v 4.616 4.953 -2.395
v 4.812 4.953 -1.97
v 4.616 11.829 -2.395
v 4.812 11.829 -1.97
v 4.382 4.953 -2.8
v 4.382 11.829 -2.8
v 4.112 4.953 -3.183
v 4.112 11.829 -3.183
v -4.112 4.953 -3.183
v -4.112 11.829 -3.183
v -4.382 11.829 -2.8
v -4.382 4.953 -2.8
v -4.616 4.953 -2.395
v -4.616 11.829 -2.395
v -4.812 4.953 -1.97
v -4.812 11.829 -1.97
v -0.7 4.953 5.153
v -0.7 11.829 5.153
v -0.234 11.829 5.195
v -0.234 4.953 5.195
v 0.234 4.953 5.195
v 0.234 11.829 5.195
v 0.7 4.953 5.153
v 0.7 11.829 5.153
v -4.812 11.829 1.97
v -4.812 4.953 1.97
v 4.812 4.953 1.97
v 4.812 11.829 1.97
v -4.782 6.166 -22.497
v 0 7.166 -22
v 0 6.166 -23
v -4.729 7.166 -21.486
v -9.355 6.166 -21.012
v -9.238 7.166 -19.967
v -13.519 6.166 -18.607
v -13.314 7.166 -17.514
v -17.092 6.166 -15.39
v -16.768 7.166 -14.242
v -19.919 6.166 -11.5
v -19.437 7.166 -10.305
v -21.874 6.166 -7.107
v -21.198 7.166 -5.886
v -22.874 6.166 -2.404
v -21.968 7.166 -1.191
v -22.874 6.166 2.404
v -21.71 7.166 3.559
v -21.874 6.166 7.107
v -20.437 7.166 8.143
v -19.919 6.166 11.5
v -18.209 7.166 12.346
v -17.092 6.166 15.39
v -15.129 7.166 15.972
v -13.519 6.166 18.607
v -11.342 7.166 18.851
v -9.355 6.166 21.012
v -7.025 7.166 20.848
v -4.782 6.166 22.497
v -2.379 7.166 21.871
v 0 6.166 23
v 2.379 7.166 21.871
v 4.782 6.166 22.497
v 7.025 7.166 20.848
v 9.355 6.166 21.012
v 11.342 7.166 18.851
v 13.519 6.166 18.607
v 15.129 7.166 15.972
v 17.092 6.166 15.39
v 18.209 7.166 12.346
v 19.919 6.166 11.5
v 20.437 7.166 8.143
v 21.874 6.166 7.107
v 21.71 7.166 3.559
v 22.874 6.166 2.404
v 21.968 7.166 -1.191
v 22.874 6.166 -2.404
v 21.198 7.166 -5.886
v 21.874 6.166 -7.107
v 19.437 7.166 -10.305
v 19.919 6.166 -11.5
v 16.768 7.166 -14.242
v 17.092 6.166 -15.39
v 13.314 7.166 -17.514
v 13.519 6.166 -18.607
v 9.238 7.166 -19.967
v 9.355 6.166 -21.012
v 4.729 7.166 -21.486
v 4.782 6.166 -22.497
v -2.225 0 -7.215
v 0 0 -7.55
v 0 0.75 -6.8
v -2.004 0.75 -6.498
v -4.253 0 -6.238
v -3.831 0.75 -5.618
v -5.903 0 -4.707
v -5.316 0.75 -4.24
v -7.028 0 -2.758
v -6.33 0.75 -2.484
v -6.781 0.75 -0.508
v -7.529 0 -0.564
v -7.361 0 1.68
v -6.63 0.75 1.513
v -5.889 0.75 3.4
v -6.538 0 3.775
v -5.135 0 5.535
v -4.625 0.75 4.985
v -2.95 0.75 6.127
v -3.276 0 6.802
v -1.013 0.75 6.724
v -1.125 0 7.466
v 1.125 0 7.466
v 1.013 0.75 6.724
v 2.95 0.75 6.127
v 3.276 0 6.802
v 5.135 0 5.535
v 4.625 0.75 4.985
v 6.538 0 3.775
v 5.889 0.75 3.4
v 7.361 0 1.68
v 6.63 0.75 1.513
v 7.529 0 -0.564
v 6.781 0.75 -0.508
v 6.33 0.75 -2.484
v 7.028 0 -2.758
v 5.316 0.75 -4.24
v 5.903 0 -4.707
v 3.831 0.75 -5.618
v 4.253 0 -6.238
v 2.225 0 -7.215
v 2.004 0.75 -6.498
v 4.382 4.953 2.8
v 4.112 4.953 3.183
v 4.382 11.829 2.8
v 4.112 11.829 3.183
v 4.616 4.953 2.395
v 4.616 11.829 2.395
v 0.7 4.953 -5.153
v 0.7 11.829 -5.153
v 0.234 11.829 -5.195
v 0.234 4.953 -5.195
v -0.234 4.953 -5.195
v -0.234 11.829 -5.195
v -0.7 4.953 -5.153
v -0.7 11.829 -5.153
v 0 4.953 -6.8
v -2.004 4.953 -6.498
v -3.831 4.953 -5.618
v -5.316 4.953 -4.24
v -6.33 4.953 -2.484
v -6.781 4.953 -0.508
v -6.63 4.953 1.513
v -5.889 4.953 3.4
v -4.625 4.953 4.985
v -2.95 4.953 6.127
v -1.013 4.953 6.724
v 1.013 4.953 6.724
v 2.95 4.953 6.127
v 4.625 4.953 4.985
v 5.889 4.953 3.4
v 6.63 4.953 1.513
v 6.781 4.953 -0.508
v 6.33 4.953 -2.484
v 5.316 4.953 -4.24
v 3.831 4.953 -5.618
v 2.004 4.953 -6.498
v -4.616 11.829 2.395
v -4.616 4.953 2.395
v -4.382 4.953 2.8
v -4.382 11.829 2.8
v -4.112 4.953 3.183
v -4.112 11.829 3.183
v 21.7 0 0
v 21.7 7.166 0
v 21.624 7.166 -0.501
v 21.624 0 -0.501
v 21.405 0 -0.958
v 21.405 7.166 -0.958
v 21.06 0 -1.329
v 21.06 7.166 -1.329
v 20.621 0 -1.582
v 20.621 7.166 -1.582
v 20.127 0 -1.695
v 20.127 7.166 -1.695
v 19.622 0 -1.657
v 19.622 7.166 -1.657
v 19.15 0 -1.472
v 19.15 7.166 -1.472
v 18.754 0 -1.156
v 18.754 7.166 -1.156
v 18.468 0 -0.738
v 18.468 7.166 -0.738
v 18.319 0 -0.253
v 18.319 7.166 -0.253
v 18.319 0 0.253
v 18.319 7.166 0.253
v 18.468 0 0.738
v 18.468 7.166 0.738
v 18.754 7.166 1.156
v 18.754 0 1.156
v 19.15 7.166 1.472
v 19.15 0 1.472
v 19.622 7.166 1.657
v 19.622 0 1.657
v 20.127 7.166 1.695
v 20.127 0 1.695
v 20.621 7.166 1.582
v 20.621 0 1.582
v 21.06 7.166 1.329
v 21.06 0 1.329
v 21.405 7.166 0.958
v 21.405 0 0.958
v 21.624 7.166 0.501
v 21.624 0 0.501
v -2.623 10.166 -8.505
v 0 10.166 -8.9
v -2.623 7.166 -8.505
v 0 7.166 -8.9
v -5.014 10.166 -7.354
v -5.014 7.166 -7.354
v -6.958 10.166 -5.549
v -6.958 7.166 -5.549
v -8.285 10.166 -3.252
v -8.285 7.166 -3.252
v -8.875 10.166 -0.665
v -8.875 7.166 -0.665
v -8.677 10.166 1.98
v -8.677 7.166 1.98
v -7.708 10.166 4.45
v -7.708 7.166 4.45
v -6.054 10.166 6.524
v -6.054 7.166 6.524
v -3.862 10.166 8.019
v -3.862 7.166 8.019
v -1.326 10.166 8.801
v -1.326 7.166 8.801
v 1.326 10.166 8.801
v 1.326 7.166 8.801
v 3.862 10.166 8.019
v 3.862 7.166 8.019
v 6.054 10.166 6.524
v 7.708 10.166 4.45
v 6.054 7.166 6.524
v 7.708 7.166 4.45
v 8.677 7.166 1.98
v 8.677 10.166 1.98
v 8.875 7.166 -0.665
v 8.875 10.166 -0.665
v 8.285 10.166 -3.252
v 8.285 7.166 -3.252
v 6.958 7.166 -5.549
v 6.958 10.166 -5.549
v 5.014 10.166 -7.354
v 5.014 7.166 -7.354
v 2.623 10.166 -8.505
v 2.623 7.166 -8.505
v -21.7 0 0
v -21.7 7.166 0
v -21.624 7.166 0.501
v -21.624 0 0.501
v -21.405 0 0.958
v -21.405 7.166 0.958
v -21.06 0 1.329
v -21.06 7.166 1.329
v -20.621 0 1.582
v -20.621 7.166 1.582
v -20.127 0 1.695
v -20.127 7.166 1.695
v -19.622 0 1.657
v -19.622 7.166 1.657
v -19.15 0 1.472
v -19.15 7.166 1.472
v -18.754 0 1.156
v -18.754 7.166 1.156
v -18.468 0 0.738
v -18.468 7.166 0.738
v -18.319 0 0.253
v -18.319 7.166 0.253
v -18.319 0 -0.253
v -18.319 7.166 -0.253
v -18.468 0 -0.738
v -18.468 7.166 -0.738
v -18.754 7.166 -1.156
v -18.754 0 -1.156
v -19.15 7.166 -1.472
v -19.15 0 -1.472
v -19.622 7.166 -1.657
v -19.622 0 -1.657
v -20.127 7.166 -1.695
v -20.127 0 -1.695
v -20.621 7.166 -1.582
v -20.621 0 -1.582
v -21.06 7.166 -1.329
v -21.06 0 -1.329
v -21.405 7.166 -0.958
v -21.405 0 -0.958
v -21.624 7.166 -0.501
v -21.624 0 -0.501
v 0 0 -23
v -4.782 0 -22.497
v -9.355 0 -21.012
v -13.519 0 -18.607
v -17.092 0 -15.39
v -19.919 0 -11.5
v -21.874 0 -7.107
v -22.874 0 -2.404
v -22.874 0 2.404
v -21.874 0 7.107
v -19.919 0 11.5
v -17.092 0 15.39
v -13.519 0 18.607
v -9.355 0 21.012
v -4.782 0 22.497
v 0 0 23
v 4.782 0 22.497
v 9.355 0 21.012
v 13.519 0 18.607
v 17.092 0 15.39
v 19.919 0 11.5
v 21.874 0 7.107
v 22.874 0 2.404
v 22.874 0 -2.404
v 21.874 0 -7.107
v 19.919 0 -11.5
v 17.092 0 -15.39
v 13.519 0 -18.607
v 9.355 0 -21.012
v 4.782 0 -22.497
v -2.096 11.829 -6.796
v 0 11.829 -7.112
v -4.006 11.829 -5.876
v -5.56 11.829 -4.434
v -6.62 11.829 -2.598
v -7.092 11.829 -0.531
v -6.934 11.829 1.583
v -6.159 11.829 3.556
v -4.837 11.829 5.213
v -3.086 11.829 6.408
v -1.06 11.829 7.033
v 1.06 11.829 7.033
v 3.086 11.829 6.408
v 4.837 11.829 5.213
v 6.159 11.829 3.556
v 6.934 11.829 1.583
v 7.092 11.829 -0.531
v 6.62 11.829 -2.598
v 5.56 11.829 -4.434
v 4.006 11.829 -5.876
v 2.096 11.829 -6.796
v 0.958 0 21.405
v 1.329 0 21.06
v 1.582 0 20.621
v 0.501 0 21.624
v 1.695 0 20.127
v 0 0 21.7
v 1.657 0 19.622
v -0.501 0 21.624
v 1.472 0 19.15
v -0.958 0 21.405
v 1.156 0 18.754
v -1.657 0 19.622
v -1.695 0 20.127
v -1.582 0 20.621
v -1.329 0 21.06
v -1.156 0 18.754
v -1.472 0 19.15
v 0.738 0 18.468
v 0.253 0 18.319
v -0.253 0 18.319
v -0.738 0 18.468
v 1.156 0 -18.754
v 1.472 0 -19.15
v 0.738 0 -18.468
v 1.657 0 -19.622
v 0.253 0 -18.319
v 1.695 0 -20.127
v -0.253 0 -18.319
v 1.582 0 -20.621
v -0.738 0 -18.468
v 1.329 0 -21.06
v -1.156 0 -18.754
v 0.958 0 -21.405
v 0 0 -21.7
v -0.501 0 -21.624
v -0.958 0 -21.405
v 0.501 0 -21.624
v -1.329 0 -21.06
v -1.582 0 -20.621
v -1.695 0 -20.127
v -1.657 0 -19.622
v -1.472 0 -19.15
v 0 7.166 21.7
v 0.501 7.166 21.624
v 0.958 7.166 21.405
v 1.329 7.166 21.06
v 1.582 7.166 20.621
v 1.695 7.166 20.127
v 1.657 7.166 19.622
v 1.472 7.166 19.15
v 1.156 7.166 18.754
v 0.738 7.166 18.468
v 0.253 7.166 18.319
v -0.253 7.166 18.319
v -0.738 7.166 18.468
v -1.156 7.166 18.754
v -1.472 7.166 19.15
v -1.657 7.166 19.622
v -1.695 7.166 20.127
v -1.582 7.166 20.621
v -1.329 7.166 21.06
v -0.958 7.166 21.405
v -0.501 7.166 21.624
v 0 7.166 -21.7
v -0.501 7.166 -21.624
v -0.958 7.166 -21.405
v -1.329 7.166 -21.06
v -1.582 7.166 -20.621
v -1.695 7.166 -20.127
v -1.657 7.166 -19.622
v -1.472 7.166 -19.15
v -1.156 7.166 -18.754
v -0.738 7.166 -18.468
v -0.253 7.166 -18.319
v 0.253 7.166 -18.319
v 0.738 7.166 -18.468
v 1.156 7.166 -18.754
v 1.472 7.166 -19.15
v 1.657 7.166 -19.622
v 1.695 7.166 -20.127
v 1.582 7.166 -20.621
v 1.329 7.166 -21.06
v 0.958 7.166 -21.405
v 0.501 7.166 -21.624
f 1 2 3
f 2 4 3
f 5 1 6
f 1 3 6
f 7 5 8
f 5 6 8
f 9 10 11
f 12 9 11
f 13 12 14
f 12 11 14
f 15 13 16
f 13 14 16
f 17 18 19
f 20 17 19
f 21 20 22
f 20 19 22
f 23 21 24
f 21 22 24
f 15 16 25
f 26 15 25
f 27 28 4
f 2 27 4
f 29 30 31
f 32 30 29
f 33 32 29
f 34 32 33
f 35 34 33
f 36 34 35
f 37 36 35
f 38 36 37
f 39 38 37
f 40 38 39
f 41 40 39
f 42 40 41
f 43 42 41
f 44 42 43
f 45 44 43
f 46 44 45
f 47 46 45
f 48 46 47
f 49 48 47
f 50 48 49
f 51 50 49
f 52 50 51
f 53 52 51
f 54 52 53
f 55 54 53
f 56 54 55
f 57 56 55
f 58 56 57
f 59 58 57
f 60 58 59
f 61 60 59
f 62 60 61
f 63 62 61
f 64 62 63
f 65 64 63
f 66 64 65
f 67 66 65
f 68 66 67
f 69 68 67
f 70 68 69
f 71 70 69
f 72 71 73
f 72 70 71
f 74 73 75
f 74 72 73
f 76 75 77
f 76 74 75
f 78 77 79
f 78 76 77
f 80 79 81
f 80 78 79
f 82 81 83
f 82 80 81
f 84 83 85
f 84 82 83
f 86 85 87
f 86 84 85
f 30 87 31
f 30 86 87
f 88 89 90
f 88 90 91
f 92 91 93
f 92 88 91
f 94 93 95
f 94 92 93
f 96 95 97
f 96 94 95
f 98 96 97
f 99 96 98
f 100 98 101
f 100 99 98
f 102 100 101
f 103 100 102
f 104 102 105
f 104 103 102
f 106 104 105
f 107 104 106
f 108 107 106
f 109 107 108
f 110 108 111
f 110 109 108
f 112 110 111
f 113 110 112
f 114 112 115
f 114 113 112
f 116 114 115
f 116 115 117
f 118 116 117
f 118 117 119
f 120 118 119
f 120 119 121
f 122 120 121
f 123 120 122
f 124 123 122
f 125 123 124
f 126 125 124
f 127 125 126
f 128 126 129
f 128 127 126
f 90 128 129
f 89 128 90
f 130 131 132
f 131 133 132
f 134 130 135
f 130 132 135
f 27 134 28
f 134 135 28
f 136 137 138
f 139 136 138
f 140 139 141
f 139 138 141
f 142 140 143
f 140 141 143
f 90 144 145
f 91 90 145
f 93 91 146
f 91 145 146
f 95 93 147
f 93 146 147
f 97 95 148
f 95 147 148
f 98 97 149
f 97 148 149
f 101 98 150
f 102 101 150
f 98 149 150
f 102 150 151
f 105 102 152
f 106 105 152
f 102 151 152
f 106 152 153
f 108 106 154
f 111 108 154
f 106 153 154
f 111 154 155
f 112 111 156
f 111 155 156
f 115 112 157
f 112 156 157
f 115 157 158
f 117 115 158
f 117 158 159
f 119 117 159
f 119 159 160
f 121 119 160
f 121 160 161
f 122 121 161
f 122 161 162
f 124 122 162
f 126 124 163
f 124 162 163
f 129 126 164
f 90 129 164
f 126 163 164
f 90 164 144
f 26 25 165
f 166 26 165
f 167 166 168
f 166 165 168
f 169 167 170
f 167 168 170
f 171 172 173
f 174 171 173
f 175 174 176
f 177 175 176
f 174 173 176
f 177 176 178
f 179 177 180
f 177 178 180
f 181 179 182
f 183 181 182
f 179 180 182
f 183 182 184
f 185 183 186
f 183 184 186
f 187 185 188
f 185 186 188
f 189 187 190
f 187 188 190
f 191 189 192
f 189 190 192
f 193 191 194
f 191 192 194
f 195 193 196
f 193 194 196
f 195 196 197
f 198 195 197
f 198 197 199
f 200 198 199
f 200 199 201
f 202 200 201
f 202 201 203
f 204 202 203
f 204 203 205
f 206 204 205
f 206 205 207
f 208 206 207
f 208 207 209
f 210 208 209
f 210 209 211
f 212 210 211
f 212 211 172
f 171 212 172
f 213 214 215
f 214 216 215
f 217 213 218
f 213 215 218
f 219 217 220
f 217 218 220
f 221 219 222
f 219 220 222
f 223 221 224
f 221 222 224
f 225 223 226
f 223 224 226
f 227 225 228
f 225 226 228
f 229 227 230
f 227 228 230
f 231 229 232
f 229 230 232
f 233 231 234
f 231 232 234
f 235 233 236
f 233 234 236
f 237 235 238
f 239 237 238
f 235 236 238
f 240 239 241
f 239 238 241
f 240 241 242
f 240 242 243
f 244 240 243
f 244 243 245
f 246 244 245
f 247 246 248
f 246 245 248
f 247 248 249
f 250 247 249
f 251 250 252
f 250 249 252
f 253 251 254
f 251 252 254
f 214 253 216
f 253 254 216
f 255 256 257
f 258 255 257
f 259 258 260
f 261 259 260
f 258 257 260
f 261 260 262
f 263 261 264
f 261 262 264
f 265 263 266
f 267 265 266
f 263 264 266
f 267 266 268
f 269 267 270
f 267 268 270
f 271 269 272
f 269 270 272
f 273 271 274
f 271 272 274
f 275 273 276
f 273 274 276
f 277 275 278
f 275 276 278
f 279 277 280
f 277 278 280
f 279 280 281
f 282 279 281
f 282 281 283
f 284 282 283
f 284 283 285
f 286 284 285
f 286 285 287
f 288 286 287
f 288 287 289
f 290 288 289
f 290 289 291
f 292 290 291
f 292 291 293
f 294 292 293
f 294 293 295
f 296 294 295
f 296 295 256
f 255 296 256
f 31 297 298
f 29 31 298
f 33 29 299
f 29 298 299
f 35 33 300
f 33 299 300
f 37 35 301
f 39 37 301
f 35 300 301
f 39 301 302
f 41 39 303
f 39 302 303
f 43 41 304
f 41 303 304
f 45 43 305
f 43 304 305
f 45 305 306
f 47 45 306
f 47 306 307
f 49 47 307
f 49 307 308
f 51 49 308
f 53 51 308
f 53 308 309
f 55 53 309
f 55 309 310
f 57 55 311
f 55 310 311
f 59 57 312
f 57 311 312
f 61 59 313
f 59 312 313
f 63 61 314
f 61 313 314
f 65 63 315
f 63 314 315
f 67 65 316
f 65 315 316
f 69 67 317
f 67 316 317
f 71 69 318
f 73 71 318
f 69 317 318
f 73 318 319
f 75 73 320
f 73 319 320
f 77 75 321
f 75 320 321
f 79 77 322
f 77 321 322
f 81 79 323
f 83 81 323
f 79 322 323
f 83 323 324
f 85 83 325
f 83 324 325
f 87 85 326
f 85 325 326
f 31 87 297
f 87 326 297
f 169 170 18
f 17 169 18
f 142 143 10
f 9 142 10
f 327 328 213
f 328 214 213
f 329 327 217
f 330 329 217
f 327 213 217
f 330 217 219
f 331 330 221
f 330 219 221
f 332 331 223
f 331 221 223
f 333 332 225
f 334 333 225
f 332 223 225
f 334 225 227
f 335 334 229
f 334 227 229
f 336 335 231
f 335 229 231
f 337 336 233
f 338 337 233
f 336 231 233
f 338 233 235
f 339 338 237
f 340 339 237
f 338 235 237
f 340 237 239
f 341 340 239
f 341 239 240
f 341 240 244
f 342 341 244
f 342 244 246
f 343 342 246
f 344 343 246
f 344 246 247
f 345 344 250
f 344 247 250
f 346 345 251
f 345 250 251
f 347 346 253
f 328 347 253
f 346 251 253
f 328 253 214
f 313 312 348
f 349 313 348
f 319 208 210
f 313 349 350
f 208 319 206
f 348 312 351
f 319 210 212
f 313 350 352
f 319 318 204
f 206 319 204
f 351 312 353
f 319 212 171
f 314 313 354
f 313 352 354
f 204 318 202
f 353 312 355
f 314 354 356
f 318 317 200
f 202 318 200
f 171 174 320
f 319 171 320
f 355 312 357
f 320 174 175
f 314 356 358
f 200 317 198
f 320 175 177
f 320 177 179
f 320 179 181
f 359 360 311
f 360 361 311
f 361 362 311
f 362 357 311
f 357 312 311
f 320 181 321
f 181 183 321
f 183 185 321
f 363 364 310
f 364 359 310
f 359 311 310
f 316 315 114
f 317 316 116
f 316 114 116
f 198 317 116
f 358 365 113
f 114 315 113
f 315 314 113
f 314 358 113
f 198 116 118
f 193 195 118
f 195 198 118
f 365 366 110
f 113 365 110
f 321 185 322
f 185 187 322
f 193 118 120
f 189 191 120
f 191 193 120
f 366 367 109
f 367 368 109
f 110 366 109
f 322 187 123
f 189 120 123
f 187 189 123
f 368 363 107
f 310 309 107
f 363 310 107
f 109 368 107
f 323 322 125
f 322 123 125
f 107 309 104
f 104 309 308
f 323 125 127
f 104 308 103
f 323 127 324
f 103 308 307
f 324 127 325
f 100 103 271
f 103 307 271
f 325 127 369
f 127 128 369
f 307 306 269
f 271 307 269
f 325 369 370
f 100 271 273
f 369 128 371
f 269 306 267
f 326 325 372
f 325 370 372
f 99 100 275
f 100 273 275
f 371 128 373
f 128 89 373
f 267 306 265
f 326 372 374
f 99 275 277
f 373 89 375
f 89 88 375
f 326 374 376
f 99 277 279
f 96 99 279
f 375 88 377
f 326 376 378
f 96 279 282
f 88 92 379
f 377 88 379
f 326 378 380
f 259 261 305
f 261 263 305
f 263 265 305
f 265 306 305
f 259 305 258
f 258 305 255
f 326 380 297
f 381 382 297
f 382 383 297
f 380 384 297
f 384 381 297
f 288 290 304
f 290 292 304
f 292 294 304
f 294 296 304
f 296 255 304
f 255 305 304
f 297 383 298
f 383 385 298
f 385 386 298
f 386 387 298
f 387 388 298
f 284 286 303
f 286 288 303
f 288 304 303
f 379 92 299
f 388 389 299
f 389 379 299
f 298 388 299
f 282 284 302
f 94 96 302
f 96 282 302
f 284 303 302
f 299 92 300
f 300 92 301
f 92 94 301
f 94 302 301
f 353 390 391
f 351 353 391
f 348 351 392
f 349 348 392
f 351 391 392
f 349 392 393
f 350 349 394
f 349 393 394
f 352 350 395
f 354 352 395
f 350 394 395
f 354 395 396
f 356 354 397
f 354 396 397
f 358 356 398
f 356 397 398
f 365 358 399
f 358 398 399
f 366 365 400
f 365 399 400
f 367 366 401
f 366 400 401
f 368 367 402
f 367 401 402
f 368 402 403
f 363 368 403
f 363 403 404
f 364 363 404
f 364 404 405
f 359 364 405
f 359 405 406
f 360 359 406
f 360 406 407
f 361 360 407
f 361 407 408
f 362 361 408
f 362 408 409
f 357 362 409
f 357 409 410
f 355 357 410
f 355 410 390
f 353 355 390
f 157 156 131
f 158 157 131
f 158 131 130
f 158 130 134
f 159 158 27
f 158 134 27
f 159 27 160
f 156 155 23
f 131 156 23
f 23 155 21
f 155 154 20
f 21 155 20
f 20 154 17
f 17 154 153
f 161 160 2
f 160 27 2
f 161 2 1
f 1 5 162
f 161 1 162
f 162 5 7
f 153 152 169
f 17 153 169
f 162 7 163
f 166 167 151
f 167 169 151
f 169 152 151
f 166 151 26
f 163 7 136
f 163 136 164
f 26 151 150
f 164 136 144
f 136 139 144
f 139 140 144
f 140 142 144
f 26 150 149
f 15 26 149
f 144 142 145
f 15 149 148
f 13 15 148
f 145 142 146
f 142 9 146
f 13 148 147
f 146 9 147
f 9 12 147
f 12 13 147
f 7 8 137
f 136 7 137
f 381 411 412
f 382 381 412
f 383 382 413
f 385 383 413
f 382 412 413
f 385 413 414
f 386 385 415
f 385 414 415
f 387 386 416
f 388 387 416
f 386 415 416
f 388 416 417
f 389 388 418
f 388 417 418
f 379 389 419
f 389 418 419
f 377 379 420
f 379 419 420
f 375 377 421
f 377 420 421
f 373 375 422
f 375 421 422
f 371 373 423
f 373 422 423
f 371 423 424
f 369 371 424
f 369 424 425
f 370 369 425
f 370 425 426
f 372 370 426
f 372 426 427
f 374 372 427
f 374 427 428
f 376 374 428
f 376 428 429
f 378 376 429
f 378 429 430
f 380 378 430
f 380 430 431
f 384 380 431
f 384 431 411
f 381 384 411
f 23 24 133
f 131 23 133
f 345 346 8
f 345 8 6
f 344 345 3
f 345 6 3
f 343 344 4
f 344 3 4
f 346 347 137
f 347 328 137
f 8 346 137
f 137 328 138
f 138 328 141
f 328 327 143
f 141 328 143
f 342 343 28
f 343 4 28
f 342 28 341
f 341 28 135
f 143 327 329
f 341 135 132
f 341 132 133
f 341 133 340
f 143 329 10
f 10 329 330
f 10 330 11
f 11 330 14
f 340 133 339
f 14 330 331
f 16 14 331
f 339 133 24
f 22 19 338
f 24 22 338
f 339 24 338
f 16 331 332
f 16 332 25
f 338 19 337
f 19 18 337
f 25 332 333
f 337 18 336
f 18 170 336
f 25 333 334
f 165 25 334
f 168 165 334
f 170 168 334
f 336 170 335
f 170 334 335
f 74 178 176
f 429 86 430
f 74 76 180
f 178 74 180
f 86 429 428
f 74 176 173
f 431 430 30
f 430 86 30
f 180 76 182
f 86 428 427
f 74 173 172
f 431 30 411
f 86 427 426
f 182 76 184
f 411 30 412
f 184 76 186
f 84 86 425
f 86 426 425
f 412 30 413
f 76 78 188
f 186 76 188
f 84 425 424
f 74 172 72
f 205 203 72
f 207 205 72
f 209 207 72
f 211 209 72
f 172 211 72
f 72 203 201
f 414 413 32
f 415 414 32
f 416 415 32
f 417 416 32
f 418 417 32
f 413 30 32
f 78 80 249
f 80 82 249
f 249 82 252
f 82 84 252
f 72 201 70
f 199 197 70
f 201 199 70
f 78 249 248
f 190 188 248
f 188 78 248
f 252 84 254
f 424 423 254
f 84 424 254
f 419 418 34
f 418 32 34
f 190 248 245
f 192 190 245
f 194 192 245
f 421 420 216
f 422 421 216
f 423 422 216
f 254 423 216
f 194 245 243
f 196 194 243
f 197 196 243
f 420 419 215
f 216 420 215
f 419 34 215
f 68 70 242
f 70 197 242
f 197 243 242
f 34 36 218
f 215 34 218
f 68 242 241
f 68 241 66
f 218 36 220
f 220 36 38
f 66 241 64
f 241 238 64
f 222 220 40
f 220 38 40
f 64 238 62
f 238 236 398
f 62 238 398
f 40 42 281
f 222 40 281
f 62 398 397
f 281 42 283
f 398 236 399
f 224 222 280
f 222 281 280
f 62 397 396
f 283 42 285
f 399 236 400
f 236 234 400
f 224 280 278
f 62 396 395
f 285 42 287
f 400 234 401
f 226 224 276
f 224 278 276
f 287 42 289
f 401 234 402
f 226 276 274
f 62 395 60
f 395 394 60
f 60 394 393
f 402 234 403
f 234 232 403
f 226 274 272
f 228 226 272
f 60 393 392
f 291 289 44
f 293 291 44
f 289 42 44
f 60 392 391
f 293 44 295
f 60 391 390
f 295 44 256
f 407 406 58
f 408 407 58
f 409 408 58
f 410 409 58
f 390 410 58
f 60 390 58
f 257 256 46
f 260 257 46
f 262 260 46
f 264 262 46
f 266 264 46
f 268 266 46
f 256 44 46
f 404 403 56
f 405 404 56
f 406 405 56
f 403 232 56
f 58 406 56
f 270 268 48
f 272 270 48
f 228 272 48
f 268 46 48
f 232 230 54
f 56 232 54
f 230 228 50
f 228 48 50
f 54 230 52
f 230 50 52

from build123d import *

# Parameters (mm, degrees)
M3_CLEARANCE_HOLE1_D = 3.4
CIRPATTERN1_COUNT    = 4
BOSS_EXTRUDE1_START  = -6.876
BOSS_EXTRUDE1_DEPTH  = 6.876
CHAMFER1_SIZE        = 0.75
CHAMFER2_SIZE        = 1


with BuildPart() as part:
    # Sketch1 → Revolve1 (revolve)
    with BuildSketch(Plane.XY, mode=Mode.PRIVATE) as revolve1_sk:
        Polygon((6.8, 0), (6.8, 4.953), (5.2, 4.953), (5.2, 11.829), (7.112, 11.829), (8.9, 10.1665), (8.9, 7.1665), (23, 7.1665), (23, 0), align=None)
    revolve(revolve1_sk.sketch.rotate(Axis((0, 0, 0), (0, 1, 0)), 90), axis=Axis((0, 0, 0), (0, 1, 0)))

    # M3 Clearance Hole1 (through all)
    with Locations(Plane.XZ):
        with Locations((-20, 0)):
            m3_clearance_hole1 = Hole(M3_CLEARANCE_HOLE1_D / 2)

    # CirPattern1: M3 Clearance Hole1 ×4 about axis
    cirpattern1_axis = Axis((0, 0, 0), (0, 1, 0))
    for i in range(1, CIRPATTERN1_COUNT):
        add(m3_clearance_hole1.rotate(cirpattern1_axis, i * 360 / CIRPATTERN1_COUNT), mode=Mode.SUBTRACT)

    # Sketch4 → Boss-Extrude1 (add)
    with BuildSketch(Plane.XZ.offset(-4.953).offset(BOSS_EXTRUDE1_START)):
        with BuildLine():
            Line((0.700412138, 5.152613205), (4.112087862, 3.182881307))
            ThreePointArc((4.112087862, 3.182881307), (2.6, 4.5033321), (0.700412138, 5.152613205))
        make_face()
        with BuildLine():
            ThreePointArc((4.8125, -1.969731898), (5.2, 0), (4.8125, 1.969731898))
            Line((4.8125, 1.969731898), (4.8125, -1.969731898))
        make_face()
        with BuildLine():
            Line((-4.112087862, 3.182881307), (-0.700412138, 5.152613205))
            ThreePointArc((-0.700412138, 5.152613205), (-2.6, 4.5033321), (-4.112087862, 3.182881307))
        make_face()
        with BuildLine():
            ThreePointArc((0.700412138, -5.152613205), (2.6, -4.5033321), (4.112087862, -3.182881307))
            Line((4.112087862, -3.182881307), (0.700412138, -5.152613205))
        make_face()
        with BuildLine():
            Line((-4.8125, -1.969731898), (-4.8125, 1.969731898))
            ThreePointArc((-4.8125, 1.969731898), (-5.2, 0), (-4.8125, -1.969731898))
        make_face()
        with BuildLine():
            ThreePointArc((-4.112087862, -3.182881307), (-2.6, -4.5033321), (-0.700412138, -5.152613205))
            Line((-0.700412138, -5.152613205), (-4.112087862, -3.182881307))
        make_face()
    extrude(amount=BOSS_EXTRUDE1_DEPTH)

    # Chamfer1
    chamfer1_edges = [part.edges().sort_by_distance(p)[0] for p in [
        (0, 0, 6.8),
    ]]
    chamfer(chamfer1_edges, length=CHAMFER1_SIZE)

    # Chamfer2
    chamfer2_edges = [part.edges().sort_by_distance(p)[0] for p in [
        (0, 7.1665, 23),
    ]]
    chamfer(chamfer2_edges, length=CHAMFER2_SIZE)


solid = part.part
